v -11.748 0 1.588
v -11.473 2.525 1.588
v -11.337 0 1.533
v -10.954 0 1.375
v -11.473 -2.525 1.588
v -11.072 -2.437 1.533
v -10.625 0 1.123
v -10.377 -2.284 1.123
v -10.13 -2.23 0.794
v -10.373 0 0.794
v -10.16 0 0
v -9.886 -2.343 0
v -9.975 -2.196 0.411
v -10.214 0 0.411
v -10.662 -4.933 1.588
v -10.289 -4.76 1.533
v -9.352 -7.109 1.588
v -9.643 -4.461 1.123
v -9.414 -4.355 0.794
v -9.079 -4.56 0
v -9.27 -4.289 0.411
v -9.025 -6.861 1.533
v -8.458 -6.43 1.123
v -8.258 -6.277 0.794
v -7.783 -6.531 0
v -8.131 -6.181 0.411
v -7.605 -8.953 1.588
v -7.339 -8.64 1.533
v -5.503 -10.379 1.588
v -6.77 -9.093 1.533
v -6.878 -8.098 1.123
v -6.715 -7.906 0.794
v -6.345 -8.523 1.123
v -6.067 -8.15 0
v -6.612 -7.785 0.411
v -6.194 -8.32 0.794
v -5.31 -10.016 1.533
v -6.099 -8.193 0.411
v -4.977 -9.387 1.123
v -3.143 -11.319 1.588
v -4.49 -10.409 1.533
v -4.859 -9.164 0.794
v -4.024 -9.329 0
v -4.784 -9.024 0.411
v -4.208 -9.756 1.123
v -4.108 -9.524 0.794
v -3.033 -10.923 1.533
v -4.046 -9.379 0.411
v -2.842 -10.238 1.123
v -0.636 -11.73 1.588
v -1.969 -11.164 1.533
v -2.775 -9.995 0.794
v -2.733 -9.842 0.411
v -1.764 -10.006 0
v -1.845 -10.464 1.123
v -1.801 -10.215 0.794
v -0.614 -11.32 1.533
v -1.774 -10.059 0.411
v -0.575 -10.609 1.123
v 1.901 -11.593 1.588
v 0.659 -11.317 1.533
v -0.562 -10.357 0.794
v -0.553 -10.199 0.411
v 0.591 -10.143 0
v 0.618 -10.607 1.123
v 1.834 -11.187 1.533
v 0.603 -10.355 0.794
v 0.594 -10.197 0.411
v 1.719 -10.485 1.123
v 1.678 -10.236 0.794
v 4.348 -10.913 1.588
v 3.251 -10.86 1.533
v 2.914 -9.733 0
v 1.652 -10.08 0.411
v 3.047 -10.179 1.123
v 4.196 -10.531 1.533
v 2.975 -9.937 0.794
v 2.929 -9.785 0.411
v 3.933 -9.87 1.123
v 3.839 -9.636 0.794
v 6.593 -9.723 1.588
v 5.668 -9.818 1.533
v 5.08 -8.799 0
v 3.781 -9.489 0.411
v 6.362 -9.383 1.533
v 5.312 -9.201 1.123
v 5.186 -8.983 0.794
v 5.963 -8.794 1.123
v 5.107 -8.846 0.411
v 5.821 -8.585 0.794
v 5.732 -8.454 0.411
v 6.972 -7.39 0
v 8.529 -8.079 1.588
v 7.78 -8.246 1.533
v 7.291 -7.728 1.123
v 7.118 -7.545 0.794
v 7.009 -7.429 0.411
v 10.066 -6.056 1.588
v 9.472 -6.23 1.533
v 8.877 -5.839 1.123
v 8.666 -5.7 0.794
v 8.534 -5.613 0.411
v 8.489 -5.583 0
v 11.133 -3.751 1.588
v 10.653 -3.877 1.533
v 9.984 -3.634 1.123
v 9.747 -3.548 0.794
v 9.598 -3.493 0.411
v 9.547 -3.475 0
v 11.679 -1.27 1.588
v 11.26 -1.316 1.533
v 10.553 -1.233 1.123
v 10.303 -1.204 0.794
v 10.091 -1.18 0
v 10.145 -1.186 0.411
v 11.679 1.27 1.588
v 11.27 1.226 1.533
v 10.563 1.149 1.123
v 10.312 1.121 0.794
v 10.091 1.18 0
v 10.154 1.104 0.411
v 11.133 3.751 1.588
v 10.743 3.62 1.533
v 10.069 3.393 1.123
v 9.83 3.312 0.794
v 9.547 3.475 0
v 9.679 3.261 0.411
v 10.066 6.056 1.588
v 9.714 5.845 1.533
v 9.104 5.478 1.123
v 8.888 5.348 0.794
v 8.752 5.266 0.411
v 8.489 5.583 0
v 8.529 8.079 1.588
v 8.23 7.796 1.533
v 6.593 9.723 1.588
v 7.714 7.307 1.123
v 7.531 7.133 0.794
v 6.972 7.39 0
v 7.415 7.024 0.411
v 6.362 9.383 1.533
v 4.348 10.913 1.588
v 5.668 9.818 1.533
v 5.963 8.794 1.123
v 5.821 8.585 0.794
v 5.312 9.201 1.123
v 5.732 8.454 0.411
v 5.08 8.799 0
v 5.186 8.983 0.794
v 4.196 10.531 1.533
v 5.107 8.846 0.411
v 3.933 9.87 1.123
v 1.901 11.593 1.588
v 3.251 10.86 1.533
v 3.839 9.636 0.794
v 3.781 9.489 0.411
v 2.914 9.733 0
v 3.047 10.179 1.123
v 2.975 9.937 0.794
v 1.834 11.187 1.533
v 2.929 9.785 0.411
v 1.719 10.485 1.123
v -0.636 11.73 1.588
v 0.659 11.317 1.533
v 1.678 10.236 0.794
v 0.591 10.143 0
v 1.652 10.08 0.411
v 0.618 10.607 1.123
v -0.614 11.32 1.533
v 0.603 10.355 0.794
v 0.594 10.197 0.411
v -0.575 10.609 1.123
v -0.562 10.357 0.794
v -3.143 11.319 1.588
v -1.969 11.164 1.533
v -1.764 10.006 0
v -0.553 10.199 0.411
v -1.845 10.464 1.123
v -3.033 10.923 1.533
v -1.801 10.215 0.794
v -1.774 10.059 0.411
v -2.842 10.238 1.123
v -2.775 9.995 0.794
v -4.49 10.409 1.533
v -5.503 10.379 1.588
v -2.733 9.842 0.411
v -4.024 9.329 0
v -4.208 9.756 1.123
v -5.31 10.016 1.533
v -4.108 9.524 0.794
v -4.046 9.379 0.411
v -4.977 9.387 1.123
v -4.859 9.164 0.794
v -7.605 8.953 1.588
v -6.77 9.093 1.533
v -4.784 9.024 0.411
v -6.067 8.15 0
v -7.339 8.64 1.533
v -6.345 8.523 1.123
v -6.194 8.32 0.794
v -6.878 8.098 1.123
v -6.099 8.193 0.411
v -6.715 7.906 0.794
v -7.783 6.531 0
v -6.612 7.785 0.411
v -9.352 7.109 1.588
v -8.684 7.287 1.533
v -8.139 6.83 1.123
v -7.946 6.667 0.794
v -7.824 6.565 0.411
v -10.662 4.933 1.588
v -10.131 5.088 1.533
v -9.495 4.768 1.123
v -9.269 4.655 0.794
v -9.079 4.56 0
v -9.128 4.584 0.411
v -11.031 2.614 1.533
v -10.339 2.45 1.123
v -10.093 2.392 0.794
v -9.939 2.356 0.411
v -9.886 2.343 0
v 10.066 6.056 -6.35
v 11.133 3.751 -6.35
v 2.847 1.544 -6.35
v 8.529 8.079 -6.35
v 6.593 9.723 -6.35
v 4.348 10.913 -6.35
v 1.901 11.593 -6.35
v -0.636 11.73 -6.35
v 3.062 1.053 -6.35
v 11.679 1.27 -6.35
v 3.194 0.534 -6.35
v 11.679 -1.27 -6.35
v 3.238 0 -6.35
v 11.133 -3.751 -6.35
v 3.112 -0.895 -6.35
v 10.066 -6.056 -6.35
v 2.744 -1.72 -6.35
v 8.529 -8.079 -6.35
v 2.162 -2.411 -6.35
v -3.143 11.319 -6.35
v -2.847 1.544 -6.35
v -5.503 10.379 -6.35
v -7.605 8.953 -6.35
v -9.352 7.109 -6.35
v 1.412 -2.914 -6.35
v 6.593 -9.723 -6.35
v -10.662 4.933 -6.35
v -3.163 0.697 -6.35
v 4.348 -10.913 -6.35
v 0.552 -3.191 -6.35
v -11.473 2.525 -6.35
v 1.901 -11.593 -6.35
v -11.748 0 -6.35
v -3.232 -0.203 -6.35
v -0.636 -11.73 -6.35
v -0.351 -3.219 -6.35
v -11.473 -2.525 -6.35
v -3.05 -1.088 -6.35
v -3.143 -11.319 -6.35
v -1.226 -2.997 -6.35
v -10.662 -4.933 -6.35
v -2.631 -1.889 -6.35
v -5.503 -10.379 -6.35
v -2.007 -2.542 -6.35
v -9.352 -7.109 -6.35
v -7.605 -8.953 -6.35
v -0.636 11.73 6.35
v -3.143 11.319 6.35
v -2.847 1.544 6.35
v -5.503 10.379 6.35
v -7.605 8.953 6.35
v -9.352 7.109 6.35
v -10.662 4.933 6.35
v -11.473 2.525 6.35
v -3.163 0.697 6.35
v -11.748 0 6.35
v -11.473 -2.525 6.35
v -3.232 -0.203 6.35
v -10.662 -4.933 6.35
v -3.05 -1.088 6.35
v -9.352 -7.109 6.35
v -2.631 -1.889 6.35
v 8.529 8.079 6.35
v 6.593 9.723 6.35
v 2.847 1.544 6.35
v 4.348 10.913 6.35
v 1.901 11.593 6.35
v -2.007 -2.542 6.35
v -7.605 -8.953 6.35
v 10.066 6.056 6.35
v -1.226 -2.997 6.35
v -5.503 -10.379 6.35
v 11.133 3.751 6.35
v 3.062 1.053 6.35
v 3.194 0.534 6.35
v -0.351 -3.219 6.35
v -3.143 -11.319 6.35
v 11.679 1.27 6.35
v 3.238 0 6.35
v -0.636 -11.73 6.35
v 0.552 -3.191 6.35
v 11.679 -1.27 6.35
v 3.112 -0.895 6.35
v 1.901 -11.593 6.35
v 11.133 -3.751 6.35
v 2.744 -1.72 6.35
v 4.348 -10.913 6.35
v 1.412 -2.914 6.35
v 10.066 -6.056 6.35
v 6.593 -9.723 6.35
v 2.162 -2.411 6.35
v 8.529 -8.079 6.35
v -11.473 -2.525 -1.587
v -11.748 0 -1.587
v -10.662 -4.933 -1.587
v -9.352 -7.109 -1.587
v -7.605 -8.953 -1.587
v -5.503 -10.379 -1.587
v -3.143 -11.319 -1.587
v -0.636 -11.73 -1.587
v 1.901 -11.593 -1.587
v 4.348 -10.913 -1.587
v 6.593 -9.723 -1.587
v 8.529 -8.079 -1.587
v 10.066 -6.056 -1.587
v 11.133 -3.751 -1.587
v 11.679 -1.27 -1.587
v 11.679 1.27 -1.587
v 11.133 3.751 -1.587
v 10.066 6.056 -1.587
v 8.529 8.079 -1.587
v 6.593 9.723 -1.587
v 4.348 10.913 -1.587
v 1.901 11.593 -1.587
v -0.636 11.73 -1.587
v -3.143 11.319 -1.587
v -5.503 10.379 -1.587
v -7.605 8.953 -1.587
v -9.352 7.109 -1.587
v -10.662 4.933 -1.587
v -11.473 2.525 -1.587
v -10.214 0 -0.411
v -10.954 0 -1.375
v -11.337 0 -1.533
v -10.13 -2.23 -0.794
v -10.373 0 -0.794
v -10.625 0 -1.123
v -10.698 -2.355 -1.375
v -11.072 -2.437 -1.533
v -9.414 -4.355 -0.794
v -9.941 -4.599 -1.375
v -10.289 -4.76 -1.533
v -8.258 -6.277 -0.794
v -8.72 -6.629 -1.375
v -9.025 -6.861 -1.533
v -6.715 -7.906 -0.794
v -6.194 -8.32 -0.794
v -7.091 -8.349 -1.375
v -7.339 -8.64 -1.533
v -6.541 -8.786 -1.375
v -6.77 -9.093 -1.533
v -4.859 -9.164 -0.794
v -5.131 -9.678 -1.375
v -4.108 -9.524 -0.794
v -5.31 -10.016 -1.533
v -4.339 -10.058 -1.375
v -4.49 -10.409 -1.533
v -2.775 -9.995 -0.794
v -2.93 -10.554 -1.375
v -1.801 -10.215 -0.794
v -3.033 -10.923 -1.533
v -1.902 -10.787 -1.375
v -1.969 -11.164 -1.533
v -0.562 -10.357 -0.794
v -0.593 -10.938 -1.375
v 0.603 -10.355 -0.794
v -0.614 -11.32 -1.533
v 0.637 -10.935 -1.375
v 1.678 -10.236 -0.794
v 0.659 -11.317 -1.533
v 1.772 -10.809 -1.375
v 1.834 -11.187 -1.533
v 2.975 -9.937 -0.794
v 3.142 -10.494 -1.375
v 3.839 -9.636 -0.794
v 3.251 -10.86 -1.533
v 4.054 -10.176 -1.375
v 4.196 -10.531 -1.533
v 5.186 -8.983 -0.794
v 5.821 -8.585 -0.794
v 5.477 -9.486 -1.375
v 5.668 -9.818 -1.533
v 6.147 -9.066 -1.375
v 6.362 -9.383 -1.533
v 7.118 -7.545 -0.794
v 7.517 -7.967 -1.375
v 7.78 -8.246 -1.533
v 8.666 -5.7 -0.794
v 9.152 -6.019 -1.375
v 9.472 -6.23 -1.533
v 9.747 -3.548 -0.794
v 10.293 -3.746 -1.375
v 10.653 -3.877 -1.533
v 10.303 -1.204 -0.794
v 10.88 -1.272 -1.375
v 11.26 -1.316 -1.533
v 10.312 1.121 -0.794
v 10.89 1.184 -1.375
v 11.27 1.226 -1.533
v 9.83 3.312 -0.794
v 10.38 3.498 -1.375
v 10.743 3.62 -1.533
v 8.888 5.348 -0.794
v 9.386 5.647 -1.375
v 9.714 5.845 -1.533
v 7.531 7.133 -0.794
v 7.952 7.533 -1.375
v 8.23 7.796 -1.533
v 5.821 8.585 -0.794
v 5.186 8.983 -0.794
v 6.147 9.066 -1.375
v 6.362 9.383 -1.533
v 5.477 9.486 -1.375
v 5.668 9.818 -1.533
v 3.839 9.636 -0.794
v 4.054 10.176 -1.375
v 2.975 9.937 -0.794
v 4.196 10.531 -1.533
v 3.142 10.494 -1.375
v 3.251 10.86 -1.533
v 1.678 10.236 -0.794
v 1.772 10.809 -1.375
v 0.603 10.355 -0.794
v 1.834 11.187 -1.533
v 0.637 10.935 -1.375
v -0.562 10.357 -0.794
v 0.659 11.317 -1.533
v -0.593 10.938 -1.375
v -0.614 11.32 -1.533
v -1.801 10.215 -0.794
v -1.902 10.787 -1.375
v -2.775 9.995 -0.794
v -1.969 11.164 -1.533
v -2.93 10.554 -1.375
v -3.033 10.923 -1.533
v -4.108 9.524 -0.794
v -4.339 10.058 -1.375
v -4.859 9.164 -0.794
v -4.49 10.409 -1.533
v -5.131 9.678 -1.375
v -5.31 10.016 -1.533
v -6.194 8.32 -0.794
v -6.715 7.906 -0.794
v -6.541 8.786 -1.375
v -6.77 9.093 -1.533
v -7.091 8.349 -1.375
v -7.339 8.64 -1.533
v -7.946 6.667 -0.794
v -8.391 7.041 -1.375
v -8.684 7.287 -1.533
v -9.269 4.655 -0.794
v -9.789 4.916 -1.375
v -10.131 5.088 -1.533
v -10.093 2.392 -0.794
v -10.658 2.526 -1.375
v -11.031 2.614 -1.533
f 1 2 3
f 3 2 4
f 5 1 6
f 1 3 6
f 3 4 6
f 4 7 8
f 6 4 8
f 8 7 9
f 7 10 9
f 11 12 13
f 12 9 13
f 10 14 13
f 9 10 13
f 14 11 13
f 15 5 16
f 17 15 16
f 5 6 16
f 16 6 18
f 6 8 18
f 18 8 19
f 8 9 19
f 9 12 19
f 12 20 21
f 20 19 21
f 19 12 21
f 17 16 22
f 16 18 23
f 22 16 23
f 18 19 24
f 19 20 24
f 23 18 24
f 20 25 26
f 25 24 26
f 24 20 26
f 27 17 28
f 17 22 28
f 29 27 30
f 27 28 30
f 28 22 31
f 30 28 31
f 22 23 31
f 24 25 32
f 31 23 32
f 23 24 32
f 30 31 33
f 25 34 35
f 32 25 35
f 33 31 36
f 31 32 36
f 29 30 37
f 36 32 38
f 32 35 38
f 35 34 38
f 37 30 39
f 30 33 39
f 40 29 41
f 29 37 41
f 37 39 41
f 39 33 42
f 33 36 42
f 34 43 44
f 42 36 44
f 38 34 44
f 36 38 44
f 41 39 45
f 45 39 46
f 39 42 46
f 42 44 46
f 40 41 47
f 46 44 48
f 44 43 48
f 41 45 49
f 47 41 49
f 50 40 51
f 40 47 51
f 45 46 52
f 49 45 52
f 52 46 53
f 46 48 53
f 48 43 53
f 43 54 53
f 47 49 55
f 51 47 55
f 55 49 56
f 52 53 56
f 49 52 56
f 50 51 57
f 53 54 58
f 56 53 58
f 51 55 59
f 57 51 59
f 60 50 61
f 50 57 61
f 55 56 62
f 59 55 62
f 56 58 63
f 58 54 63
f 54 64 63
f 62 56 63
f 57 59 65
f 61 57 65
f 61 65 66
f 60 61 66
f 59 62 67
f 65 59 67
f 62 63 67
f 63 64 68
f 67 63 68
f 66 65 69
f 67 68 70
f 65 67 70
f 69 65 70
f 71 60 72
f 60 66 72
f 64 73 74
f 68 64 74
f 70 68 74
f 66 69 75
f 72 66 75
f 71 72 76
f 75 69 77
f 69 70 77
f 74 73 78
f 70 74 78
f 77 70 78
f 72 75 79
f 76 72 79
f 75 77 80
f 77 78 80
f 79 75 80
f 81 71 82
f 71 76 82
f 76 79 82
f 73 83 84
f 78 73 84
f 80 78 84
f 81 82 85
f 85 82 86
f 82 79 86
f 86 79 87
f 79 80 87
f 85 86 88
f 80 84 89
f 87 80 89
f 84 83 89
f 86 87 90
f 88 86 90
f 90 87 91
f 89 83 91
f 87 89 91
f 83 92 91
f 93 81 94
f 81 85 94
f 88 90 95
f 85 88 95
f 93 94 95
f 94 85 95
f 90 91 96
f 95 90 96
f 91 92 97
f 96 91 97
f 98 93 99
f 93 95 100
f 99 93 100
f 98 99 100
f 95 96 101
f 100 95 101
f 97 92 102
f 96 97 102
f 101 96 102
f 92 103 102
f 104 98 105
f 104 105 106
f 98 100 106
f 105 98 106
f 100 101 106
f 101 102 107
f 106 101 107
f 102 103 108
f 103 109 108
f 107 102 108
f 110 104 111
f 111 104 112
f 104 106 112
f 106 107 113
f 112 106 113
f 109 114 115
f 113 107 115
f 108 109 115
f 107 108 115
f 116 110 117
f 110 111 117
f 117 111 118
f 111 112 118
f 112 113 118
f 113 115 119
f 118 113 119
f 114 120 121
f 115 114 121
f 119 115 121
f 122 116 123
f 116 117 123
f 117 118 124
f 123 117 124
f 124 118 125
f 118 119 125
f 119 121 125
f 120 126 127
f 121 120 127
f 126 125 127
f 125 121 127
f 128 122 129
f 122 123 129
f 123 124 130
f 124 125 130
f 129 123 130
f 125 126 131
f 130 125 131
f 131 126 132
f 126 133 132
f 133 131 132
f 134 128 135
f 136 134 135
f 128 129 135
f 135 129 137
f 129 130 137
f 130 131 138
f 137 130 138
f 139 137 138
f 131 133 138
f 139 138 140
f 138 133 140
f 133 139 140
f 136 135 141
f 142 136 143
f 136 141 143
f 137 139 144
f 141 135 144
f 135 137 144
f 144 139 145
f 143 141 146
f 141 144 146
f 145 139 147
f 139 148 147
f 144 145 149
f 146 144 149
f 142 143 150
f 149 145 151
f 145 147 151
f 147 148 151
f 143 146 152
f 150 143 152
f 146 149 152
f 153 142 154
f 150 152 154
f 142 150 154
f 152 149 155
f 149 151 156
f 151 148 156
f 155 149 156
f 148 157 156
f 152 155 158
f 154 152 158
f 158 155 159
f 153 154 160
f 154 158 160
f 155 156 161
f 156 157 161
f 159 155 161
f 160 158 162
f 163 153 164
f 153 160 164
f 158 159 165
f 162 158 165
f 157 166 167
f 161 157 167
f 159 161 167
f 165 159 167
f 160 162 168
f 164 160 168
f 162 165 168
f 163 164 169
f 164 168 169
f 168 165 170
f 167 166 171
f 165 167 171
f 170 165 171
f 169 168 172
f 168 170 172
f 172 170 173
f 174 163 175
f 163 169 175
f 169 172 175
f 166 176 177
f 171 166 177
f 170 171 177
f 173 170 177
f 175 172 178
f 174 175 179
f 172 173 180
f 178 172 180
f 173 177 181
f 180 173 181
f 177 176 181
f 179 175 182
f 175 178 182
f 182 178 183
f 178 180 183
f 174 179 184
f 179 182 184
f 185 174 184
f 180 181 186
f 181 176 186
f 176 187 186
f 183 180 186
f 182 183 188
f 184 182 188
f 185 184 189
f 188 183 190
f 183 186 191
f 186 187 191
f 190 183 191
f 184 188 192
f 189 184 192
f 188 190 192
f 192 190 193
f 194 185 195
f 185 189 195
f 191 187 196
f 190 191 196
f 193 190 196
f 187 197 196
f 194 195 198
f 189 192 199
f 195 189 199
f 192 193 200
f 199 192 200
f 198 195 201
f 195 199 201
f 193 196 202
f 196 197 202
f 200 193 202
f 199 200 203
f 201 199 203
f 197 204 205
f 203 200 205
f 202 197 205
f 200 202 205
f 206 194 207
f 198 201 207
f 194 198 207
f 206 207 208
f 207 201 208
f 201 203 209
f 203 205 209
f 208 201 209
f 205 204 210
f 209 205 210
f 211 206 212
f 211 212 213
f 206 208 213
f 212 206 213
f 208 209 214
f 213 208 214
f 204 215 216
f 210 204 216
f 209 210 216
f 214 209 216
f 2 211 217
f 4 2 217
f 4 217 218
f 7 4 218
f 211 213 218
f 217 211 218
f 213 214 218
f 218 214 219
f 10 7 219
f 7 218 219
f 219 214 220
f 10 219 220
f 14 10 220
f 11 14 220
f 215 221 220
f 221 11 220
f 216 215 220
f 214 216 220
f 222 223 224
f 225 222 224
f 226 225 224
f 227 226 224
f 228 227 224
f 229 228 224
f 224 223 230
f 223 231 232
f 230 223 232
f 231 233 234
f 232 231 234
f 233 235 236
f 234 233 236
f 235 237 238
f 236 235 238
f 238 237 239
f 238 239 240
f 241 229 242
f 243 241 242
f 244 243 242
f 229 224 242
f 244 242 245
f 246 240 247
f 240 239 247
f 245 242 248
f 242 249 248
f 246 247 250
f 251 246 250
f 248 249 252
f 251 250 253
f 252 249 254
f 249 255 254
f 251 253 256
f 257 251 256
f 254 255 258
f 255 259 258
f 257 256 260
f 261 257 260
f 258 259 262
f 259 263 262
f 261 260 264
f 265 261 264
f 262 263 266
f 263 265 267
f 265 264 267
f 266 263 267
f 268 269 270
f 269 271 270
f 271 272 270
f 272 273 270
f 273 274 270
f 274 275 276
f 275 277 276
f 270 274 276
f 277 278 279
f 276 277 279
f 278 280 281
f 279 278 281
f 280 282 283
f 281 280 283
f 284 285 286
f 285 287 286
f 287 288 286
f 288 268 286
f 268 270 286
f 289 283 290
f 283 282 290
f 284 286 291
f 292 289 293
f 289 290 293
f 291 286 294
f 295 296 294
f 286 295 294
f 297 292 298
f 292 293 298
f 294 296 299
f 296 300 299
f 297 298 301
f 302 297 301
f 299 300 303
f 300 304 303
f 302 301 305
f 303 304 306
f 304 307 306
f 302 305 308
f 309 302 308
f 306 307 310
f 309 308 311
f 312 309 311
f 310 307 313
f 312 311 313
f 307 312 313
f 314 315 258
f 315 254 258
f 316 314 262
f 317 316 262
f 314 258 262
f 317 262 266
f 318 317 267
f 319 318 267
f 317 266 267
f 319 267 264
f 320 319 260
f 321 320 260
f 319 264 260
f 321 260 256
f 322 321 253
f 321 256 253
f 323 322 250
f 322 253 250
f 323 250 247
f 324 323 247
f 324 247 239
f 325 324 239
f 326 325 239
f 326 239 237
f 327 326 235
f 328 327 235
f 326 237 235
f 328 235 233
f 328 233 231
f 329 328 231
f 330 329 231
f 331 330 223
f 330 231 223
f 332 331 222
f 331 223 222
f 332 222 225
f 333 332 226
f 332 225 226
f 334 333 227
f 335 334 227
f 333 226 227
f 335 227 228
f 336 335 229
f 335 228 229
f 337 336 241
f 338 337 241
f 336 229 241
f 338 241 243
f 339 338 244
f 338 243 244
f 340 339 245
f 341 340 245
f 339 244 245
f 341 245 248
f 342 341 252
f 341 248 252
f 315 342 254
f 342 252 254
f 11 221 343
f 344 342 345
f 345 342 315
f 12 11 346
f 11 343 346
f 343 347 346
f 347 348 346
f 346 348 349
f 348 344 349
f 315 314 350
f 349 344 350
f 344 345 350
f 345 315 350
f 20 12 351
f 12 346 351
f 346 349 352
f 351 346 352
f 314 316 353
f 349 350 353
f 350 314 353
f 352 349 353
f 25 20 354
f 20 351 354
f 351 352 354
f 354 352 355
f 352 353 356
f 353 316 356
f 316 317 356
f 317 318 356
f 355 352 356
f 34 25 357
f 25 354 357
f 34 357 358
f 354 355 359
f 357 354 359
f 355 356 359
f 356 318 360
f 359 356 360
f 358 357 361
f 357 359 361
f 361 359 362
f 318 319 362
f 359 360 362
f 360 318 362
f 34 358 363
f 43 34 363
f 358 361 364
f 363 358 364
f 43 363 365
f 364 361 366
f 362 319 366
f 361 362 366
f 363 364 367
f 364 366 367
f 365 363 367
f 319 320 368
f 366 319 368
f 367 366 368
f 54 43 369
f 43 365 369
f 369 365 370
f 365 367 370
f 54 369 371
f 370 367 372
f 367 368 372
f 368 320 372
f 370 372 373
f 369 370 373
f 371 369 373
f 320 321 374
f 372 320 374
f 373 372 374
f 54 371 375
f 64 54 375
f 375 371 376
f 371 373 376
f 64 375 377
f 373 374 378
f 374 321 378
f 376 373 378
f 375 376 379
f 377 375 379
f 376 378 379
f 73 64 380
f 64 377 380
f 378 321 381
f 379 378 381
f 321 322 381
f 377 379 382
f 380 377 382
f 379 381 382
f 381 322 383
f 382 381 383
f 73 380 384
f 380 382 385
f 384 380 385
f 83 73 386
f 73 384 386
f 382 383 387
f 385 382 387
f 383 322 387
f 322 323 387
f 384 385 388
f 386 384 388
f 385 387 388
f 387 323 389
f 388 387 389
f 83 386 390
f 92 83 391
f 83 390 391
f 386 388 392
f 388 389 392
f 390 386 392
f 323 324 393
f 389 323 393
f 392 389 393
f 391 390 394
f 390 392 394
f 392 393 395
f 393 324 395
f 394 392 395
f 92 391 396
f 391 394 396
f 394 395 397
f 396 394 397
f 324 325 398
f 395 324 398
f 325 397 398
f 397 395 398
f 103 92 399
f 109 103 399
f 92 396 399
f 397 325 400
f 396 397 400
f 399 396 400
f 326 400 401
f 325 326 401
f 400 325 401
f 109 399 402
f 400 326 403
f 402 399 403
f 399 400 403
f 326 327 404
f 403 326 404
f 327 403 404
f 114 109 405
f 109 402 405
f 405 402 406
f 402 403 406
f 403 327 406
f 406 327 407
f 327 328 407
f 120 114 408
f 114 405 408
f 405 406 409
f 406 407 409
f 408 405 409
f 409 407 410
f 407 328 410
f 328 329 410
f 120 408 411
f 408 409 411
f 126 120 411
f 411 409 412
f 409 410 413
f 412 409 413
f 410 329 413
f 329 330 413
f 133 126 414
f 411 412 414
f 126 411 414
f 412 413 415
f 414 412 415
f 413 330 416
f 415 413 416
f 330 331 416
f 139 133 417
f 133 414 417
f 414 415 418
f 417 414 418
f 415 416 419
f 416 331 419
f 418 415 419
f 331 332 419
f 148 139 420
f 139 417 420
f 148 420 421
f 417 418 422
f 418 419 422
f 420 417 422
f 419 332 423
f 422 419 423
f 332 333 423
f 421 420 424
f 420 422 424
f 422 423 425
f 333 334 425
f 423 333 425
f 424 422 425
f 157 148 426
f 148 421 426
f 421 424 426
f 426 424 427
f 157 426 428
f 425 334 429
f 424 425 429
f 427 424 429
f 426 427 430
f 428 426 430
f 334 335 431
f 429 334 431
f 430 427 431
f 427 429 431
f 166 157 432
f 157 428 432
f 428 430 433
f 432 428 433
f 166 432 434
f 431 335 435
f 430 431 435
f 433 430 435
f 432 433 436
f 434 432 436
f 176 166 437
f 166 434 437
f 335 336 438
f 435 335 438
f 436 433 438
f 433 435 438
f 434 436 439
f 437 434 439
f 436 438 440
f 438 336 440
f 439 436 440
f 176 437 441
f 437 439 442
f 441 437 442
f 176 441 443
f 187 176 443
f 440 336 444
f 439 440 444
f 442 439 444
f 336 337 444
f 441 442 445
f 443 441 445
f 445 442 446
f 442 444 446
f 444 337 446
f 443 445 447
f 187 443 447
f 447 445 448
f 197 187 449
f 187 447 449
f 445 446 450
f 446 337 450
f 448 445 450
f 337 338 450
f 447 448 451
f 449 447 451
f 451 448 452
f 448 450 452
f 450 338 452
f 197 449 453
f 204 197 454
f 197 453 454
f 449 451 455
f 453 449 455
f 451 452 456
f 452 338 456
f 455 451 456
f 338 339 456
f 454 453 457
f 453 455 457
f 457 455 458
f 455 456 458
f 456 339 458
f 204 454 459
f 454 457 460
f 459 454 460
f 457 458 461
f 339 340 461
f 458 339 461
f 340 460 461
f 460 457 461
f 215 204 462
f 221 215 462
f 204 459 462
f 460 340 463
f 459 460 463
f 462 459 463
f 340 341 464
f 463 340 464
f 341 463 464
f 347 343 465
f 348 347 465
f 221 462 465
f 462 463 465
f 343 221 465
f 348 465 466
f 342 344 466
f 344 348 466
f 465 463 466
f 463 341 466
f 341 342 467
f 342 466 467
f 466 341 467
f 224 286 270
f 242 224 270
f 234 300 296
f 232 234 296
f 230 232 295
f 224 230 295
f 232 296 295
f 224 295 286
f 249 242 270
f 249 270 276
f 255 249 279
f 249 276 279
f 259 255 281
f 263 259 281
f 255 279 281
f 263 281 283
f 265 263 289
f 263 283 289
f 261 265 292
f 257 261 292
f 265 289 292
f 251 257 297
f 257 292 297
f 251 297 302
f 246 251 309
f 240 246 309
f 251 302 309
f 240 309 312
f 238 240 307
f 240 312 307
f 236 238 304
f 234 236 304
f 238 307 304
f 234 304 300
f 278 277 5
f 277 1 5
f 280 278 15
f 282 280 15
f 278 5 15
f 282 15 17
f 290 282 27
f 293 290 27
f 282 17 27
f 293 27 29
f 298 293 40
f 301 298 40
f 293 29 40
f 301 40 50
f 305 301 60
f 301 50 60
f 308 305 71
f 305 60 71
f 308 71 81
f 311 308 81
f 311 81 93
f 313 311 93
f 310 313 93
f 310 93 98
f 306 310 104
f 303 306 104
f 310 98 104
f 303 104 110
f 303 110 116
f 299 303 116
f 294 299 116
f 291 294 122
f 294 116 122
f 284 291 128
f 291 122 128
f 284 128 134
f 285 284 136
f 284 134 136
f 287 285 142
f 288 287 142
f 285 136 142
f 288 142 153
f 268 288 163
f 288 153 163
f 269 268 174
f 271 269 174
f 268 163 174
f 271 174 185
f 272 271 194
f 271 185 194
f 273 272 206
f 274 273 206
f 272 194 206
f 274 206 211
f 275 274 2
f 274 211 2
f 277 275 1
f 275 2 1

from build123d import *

# Parameters (mm, degrees)
F3_DEPTH = 12.701


with BuildPart() as f1:
    # F0 (on Front) → F1 (revolve)
    with BuildSketch(Plane.XZ):
        with BuildLine():
            Line((0, -6.35), (0, 0))
            Line((0, 0), (0, 6.35))
            Line((0, 6.35), (-11.7475, 6.35))
            Line((-11.7475, 6.35), (-11.7475, 1.5875))
            ThreePointArc((-11.7475, 1.5875), (-10.624968, 1.122532), (-10.16, 0))
            ThreePointArc((-10.16, 0), (-10.624968, -1.122532), (-11.7475, -1.5875))
            Line((-11.7475, -1.5875), (-11.7475, -6.35))
            Line((-11.7475, -6.35), (0, -6.35))
        make_face()
    revolve(axis=Axis((0, 0, 3.175), (0, 0, 1)))

    # F2 (on face) → F3 (cut, through all)
    with BuildSketch(Plane.XY.offset(6.35)):
        with BuildLine():
            ThreePointArc((-2.846846, 1.54381), (-0.796358, -3.13906), (3.2385, 0))
            ThreePointArc((3.2385, 0), (3.13906, 0.796358), (2.846846, 1.54381))
            Line((2.846846, 1.54381), (-2.846846, 1.54381))
        make_face()
    extrude(amount=-F3_DEPTH, mode=Mode.SUBTRACT)


solid = f1.part
